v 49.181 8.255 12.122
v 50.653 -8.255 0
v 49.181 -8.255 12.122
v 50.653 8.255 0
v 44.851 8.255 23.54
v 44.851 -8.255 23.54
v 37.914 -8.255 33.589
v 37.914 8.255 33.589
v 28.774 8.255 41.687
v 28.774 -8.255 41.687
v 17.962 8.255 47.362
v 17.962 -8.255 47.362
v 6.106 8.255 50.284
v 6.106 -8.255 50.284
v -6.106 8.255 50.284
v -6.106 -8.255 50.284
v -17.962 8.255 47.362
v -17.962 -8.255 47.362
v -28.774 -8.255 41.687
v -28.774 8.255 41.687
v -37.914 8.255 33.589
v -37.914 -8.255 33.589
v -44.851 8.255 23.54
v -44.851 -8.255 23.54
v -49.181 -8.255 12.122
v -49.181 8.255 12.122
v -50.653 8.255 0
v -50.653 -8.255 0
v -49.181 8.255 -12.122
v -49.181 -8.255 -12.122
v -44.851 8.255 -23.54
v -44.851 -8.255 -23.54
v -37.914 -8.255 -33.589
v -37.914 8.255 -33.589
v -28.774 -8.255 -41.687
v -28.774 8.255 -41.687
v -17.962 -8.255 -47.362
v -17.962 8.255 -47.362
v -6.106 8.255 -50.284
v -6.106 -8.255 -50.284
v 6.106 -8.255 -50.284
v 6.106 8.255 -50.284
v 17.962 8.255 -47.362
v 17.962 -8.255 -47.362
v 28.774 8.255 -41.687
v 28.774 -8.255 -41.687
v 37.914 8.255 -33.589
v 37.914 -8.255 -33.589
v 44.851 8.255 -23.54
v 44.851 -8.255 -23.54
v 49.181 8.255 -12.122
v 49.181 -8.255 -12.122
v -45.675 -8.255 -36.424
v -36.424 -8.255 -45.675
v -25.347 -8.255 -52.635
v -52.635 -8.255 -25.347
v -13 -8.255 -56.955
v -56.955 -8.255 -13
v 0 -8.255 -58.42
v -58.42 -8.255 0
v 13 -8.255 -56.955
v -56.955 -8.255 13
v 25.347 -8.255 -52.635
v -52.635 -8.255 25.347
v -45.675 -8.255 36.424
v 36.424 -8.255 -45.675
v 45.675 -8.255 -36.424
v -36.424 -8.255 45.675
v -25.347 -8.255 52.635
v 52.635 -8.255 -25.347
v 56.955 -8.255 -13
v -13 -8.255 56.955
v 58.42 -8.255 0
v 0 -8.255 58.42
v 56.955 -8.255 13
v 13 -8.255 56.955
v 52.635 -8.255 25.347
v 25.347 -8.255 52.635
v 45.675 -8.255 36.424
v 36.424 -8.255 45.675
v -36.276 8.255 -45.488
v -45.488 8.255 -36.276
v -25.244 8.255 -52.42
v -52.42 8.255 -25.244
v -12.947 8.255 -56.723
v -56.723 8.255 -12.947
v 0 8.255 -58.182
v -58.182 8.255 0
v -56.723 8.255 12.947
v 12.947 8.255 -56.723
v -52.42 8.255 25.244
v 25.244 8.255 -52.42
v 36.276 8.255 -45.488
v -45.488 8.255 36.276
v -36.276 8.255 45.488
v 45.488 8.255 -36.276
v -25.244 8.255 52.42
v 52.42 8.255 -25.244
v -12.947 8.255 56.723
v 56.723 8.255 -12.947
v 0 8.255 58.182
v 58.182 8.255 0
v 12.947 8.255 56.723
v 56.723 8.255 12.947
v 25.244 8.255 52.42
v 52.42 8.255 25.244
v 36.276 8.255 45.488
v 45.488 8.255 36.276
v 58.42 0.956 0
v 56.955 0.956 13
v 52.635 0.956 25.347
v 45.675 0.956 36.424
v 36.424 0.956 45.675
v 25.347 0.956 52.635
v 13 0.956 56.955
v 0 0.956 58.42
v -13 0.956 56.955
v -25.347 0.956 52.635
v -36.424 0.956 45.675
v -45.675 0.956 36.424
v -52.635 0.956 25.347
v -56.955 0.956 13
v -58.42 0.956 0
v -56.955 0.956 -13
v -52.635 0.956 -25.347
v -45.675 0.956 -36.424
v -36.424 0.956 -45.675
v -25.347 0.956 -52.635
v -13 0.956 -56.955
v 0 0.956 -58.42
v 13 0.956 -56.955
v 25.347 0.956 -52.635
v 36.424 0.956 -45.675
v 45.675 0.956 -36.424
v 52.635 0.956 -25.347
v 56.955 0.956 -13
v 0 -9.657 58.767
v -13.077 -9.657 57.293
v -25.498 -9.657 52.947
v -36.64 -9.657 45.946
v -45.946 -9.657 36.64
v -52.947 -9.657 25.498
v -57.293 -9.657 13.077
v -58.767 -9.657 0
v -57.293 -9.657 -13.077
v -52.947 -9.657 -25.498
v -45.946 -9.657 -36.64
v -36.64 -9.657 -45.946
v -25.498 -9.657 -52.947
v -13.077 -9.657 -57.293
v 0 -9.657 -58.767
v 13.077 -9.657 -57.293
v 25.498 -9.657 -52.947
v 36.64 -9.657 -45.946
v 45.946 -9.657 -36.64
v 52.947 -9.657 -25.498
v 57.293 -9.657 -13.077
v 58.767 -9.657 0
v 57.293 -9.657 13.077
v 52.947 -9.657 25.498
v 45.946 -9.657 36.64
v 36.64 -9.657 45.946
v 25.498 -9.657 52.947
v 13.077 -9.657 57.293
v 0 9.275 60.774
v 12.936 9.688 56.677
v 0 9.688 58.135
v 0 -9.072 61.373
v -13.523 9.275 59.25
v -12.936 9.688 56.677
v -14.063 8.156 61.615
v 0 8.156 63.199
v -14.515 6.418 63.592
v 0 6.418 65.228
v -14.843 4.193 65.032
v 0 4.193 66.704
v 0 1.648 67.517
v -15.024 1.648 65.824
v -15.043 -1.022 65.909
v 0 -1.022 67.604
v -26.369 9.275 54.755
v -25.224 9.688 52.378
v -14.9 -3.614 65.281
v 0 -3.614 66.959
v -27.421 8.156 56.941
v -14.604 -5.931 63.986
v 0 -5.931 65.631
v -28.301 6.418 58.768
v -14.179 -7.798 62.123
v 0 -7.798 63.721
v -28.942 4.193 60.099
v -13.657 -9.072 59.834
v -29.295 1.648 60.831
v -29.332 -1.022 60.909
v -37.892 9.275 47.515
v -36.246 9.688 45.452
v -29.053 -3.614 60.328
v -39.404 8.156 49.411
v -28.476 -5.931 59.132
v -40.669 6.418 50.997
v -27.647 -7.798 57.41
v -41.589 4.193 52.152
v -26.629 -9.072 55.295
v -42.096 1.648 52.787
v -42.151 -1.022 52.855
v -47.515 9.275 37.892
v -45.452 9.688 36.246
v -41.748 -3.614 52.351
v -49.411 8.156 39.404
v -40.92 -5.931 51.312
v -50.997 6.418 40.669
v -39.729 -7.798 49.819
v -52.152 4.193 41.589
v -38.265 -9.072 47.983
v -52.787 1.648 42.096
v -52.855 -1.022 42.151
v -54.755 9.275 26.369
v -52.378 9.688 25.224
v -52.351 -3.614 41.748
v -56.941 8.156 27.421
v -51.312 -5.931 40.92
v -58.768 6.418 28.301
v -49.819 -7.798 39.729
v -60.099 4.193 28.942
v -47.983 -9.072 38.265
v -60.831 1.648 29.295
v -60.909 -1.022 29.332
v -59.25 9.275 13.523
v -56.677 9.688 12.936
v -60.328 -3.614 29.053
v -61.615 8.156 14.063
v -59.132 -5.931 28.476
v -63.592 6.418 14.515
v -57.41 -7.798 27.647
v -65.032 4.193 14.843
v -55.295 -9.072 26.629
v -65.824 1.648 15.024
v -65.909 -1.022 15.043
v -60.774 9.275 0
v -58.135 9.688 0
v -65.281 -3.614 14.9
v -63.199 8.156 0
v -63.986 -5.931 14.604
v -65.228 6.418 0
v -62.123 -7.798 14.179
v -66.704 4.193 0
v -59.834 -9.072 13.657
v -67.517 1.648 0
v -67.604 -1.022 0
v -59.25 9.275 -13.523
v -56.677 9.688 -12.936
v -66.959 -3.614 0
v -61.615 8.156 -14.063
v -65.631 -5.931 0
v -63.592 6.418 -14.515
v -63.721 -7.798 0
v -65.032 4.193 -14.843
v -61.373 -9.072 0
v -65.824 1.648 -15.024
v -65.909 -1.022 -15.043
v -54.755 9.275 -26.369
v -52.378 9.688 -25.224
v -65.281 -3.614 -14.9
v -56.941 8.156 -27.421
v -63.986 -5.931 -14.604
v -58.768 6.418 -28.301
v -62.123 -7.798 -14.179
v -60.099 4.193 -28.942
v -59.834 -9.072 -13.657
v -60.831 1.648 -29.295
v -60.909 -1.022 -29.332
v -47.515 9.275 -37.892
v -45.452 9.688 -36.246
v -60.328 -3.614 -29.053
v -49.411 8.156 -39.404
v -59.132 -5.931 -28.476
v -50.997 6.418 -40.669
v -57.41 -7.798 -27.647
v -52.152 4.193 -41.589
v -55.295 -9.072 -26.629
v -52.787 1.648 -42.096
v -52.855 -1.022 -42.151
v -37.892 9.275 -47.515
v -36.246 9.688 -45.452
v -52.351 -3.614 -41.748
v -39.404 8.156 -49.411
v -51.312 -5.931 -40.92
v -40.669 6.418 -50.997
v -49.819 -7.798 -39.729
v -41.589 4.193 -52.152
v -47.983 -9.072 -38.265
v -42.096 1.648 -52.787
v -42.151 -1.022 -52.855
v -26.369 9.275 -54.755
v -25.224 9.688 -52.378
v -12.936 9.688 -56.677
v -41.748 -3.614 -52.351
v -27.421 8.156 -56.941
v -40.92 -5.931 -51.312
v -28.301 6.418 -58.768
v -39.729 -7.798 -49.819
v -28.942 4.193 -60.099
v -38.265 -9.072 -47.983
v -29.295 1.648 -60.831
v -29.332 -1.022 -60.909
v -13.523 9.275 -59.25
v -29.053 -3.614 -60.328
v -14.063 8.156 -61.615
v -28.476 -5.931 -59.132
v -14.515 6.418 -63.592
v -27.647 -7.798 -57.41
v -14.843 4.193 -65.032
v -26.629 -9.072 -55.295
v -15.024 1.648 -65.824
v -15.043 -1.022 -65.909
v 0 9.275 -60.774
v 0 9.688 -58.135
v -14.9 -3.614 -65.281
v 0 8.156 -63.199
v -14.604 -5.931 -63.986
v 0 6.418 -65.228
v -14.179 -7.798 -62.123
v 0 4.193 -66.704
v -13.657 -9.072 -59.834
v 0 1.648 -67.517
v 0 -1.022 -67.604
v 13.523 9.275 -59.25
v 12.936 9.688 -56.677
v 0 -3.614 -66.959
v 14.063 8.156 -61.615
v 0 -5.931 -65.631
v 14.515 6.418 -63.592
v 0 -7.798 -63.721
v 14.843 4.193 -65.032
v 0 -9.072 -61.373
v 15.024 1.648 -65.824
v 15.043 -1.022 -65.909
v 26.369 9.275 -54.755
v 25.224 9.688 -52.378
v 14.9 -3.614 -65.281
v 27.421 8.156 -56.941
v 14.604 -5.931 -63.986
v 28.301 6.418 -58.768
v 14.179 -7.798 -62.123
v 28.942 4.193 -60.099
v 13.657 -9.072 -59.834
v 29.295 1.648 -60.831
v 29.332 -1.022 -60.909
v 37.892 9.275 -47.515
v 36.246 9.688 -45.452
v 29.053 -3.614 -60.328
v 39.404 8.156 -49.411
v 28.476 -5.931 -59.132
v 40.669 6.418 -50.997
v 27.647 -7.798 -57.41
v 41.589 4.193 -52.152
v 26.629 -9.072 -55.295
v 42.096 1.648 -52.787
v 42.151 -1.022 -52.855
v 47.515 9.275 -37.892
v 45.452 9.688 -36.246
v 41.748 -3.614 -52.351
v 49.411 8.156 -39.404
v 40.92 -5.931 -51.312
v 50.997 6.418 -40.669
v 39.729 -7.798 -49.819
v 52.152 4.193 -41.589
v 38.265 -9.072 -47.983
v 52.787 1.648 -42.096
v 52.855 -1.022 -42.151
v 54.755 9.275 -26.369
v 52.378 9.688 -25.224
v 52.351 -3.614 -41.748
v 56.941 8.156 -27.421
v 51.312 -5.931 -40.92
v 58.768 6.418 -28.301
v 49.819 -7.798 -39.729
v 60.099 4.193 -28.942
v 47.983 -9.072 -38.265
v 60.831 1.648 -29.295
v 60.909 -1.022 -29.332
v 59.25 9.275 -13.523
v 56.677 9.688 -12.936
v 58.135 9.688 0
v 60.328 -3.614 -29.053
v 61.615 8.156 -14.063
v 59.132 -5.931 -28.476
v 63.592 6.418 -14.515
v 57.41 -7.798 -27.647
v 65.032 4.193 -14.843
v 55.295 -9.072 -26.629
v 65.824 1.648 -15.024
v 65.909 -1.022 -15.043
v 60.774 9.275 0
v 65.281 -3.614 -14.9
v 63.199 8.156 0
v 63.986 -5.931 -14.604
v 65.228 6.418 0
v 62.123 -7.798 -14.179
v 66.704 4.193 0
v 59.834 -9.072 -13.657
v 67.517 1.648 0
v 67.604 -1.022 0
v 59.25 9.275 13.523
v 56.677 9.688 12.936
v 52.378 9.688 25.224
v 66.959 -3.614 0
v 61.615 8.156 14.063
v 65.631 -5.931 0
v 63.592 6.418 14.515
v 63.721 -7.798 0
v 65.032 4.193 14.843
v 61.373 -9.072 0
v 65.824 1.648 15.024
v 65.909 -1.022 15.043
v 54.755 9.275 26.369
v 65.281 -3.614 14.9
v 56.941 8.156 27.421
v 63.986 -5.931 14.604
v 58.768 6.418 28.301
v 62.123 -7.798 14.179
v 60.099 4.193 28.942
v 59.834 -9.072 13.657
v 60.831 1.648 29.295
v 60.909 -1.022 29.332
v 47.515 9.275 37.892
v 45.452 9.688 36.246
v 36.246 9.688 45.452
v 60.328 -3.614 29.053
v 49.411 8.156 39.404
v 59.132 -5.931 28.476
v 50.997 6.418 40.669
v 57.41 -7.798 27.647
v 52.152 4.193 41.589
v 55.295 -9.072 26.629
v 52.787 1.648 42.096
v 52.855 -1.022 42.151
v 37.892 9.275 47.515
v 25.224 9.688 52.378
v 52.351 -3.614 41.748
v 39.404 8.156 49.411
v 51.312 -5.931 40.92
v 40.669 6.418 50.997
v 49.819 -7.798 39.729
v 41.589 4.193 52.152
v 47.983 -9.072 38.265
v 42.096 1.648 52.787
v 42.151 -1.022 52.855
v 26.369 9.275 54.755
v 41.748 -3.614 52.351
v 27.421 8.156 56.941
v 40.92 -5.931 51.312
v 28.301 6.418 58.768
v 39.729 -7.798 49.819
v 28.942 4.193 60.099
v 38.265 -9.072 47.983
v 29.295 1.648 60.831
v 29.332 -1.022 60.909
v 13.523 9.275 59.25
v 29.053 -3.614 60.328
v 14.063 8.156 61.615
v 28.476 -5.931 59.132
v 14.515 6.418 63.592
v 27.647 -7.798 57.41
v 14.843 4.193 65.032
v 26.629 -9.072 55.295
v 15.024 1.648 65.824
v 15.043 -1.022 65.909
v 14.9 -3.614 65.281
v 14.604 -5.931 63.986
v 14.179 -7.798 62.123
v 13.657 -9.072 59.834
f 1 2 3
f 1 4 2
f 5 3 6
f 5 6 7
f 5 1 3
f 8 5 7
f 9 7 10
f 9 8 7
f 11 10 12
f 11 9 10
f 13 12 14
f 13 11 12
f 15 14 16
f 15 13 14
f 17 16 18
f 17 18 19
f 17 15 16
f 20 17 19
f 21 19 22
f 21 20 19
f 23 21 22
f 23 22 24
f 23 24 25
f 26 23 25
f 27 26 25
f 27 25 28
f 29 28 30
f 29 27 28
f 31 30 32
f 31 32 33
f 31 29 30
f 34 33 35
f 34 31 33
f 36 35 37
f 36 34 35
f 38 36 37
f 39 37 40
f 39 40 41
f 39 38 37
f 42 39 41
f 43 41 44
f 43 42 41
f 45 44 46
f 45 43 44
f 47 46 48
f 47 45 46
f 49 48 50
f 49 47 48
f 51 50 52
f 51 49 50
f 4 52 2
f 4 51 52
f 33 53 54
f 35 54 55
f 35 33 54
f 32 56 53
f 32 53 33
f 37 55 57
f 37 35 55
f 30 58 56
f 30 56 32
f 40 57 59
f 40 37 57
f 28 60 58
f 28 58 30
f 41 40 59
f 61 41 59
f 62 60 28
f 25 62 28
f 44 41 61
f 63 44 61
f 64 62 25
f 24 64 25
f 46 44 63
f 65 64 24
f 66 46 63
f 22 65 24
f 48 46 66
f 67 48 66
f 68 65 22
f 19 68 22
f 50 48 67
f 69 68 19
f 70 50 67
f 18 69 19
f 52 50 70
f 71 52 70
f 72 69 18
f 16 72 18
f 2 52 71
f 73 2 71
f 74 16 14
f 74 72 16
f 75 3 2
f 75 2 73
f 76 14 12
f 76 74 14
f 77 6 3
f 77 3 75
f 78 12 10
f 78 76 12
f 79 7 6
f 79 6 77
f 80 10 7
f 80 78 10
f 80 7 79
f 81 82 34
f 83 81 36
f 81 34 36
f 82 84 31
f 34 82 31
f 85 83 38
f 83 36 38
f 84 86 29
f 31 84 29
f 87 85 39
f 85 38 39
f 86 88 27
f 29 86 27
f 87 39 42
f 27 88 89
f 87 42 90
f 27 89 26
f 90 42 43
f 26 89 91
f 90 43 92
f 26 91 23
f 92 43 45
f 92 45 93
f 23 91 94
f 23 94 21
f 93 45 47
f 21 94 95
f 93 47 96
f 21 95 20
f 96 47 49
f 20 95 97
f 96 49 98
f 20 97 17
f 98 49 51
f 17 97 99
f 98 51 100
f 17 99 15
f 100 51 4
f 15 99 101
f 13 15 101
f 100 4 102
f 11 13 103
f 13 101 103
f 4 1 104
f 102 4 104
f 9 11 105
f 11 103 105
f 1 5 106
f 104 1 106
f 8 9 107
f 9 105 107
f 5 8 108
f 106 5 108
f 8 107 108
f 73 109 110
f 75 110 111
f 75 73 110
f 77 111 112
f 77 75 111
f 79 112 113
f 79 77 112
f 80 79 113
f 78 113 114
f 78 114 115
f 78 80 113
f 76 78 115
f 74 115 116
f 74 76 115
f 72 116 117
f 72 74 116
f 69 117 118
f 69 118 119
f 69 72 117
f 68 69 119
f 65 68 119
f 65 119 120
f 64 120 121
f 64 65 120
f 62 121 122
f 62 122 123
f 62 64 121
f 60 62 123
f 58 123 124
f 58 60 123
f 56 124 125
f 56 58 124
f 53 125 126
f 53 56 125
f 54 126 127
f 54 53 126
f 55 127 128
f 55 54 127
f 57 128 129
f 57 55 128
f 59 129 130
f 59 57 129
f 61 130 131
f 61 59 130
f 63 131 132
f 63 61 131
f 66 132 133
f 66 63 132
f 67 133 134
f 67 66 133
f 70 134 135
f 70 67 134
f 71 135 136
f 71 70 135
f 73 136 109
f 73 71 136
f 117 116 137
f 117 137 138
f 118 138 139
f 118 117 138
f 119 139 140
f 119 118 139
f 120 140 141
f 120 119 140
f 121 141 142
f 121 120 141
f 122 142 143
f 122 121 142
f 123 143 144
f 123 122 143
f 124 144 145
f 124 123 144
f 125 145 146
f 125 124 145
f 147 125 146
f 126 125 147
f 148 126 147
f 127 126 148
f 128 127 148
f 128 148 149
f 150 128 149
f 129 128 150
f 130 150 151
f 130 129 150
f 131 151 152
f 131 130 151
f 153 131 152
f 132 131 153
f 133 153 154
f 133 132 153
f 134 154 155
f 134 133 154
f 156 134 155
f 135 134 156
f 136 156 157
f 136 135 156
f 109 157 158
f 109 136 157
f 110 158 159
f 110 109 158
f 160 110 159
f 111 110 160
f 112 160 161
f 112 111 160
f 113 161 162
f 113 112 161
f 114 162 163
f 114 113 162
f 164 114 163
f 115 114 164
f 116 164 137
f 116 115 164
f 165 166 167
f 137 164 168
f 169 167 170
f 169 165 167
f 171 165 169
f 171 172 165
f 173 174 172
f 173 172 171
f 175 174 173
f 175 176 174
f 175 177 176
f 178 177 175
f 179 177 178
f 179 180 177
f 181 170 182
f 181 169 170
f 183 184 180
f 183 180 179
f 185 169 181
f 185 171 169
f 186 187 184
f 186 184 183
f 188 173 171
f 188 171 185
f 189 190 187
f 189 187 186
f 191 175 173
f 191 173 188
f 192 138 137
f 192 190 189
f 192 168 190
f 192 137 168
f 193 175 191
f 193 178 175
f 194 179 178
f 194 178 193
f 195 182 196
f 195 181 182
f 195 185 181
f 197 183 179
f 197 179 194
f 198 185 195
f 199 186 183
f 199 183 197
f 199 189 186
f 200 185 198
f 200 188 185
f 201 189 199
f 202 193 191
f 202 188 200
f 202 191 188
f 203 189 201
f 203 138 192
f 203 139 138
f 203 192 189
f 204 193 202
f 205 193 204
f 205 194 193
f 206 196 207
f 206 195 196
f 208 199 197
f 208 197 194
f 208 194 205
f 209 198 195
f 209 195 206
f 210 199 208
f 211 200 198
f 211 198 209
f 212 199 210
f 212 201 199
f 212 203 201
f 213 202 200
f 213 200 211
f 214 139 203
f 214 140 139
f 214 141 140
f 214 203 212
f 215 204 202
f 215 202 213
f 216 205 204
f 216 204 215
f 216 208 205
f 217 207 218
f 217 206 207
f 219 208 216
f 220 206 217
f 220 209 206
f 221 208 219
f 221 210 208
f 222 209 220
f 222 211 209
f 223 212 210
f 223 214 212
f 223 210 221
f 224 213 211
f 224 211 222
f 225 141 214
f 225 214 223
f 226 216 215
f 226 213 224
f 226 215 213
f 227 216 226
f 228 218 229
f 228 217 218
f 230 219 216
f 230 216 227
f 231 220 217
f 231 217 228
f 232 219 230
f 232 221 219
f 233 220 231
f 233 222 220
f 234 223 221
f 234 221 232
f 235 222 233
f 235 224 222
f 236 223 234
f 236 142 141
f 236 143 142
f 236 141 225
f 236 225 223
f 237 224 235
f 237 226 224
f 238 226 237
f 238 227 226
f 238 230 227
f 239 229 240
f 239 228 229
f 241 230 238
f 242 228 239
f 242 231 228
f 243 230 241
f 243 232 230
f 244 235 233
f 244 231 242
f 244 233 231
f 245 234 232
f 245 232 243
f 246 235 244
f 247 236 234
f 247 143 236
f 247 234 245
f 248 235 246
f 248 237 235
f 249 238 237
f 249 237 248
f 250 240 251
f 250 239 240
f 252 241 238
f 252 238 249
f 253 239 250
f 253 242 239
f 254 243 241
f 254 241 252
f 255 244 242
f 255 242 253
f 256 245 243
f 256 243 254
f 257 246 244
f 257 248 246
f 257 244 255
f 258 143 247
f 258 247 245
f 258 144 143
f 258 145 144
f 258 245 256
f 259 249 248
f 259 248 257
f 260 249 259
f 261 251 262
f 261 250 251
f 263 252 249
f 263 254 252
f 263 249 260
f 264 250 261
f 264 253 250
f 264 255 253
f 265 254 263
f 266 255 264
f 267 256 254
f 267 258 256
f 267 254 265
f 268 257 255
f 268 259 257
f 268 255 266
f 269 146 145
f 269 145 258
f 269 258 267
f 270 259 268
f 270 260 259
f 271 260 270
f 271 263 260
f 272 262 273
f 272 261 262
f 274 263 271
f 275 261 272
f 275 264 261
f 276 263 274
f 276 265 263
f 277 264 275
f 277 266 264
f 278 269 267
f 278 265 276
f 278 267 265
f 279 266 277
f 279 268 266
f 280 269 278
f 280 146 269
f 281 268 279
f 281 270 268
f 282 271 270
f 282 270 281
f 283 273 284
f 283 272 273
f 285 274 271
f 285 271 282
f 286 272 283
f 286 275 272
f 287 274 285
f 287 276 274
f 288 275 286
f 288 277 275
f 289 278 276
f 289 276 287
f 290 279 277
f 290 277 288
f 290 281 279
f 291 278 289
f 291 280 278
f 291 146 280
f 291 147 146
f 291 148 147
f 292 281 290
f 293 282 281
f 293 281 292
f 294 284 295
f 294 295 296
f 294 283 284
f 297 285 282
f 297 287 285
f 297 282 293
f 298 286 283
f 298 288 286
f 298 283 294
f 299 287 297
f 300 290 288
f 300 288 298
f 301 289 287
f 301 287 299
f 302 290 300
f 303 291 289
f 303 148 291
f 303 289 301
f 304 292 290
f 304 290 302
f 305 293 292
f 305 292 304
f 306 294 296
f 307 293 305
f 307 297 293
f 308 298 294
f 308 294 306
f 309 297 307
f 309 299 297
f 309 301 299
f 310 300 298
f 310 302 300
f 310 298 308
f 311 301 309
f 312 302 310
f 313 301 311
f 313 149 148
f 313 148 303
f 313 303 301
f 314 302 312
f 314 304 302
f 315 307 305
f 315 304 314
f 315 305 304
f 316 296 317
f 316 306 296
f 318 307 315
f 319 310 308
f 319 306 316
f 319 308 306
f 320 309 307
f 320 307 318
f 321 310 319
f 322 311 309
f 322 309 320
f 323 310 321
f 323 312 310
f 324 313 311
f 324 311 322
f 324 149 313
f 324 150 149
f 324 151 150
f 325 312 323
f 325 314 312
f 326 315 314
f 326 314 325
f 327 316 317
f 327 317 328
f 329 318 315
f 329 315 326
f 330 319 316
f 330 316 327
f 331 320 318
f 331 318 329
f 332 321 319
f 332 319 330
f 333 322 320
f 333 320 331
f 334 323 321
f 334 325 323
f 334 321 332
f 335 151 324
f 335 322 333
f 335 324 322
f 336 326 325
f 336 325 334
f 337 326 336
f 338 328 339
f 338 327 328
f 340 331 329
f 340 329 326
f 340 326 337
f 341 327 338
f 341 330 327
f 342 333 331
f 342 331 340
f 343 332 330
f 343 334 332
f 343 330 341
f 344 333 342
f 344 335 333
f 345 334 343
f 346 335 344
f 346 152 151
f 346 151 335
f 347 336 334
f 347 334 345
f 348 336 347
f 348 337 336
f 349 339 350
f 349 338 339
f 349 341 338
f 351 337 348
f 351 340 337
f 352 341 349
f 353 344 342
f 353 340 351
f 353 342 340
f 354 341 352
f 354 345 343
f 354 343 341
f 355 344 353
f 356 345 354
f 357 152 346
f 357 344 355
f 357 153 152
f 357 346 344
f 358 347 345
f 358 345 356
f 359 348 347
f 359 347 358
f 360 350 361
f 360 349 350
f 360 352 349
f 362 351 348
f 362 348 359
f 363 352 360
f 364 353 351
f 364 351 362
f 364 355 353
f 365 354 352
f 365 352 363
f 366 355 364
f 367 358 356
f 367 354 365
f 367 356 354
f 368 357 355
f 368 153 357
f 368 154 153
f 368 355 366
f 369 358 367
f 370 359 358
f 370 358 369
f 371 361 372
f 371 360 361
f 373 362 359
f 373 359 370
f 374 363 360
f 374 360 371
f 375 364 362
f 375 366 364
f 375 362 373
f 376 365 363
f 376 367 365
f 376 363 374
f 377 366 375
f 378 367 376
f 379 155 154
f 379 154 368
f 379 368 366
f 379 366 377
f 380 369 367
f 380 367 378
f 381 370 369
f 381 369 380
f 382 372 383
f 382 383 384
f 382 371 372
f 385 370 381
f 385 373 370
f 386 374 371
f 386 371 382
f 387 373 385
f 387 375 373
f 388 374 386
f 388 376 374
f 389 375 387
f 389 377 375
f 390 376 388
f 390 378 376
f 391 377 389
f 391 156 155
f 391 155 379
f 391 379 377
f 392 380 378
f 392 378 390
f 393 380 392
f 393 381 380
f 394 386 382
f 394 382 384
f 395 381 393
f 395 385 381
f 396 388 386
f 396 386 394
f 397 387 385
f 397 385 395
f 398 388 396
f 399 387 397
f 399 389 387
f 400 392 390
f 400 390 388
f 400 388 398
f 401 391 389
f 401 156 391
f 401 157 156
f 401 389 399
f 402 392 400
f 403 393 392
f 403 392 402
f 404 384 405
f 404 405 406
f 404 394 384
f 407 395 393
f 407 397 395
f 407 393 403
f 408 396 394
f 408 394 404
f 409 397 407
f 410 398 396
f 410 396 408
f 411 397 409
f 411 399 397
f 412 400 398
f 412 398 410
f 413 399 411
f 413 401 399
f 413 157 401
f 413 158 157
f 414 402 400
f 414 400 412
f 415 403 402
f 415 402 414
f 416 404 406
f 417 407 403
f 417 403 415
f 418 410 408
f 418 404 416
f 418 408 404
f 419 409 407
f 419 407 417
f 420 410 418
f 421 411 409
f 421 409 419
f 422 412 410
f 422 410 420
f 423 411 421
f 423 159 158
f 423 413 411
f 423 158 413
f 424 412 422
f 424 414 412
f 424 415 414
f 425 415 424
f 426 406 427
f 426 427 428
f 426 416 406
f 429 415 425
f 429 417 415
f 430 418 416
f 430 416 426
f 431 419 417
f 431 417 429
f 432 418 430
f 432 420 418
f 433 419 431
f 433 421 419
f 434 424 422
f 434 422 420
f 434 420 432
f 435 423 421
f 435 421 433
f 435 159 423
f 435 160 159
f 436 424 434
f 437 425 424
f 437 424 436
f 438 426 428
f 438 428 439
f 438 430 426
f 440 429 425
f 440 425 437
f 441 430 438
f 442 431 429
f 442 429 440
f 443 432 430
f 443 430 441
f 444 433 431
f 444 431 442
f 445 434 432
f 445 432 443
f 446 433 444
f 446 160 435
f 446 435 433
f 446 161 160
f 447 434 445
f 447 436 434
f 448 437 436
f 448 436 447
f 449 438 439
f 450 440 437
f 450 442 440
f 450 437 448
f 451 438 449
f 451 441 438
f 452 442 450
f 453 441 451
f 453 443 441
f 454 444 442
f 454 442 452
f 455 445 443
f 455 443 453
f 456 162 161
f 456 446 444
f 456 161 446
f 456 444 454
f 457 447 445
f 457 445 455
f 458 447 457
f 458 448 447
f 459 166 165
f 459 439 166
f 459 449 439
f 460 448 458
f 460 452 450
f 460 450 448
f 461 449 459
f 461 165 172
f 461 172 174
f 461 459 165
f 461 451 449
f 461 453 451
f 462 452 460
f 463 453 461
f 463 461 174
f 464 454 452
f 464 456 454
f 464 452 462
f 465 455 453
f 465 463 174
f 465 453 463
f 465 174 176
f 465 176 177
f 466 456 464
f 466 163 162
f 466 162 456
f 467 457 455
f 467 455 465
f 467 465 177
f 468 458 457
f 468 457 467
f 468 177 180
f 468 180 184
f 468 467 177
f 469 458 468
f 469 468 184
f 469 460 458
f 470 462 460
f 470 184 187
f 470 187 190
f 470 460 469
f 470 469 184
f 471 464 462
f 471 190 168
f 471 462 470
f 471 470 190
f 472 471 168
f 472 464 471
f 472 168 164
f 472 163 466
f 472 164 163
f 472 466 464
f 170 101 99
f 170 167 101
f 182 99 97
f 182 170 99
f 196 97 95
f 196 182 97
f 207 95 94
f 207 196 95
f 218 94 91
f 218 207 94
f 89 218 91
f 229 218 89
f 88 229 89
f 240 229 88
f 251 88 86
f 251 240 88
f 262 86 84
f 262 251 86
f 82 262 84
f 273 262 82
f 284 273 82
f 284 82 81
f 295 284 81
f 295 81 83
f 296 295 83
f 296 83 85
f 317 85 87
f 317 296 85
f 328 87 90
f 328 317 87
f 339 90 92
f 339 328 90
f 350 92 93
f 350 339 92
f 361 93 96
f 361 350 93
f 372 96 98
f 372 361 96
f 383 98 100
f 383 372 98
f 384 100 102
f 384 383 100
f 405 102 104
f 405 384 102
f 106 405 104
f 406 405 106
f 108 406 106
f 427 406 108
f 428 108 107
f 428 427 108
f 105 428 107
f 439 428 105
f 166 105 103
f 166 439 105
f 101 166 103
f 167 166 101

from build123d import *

# Parameters (mm, degrees)
F0_R     = 58.419928
F0_R_2   = 50.653175
F4_DEPTH = 8.255


with BuildPart() as f3:
    # F1 (on Right) → F3 (revolve)
    with BuildSketch(Plane.YZ):
        with BuildLine():
            Line((-9.656509, 58.766587), (9.687974, 58.134703))
            ThreePointArc((9.687974, 58.134703), (0.316333, 67.653236), (-9.656509, 58.766587))
        make_face()
    revolve(axis=Axis((0, -0.11386, 0), (0, -1, 0)))

    # F0 (on Front) → F4 (join, symmetric)
    with BuildSketch(Plane.XZ):
        Circle(F0_R)
        Circle(F0_R_2, mode=Mode.SUBTRACT)
    extrude(amount=F4_DEPTH, both=True)


solid = f3.part
